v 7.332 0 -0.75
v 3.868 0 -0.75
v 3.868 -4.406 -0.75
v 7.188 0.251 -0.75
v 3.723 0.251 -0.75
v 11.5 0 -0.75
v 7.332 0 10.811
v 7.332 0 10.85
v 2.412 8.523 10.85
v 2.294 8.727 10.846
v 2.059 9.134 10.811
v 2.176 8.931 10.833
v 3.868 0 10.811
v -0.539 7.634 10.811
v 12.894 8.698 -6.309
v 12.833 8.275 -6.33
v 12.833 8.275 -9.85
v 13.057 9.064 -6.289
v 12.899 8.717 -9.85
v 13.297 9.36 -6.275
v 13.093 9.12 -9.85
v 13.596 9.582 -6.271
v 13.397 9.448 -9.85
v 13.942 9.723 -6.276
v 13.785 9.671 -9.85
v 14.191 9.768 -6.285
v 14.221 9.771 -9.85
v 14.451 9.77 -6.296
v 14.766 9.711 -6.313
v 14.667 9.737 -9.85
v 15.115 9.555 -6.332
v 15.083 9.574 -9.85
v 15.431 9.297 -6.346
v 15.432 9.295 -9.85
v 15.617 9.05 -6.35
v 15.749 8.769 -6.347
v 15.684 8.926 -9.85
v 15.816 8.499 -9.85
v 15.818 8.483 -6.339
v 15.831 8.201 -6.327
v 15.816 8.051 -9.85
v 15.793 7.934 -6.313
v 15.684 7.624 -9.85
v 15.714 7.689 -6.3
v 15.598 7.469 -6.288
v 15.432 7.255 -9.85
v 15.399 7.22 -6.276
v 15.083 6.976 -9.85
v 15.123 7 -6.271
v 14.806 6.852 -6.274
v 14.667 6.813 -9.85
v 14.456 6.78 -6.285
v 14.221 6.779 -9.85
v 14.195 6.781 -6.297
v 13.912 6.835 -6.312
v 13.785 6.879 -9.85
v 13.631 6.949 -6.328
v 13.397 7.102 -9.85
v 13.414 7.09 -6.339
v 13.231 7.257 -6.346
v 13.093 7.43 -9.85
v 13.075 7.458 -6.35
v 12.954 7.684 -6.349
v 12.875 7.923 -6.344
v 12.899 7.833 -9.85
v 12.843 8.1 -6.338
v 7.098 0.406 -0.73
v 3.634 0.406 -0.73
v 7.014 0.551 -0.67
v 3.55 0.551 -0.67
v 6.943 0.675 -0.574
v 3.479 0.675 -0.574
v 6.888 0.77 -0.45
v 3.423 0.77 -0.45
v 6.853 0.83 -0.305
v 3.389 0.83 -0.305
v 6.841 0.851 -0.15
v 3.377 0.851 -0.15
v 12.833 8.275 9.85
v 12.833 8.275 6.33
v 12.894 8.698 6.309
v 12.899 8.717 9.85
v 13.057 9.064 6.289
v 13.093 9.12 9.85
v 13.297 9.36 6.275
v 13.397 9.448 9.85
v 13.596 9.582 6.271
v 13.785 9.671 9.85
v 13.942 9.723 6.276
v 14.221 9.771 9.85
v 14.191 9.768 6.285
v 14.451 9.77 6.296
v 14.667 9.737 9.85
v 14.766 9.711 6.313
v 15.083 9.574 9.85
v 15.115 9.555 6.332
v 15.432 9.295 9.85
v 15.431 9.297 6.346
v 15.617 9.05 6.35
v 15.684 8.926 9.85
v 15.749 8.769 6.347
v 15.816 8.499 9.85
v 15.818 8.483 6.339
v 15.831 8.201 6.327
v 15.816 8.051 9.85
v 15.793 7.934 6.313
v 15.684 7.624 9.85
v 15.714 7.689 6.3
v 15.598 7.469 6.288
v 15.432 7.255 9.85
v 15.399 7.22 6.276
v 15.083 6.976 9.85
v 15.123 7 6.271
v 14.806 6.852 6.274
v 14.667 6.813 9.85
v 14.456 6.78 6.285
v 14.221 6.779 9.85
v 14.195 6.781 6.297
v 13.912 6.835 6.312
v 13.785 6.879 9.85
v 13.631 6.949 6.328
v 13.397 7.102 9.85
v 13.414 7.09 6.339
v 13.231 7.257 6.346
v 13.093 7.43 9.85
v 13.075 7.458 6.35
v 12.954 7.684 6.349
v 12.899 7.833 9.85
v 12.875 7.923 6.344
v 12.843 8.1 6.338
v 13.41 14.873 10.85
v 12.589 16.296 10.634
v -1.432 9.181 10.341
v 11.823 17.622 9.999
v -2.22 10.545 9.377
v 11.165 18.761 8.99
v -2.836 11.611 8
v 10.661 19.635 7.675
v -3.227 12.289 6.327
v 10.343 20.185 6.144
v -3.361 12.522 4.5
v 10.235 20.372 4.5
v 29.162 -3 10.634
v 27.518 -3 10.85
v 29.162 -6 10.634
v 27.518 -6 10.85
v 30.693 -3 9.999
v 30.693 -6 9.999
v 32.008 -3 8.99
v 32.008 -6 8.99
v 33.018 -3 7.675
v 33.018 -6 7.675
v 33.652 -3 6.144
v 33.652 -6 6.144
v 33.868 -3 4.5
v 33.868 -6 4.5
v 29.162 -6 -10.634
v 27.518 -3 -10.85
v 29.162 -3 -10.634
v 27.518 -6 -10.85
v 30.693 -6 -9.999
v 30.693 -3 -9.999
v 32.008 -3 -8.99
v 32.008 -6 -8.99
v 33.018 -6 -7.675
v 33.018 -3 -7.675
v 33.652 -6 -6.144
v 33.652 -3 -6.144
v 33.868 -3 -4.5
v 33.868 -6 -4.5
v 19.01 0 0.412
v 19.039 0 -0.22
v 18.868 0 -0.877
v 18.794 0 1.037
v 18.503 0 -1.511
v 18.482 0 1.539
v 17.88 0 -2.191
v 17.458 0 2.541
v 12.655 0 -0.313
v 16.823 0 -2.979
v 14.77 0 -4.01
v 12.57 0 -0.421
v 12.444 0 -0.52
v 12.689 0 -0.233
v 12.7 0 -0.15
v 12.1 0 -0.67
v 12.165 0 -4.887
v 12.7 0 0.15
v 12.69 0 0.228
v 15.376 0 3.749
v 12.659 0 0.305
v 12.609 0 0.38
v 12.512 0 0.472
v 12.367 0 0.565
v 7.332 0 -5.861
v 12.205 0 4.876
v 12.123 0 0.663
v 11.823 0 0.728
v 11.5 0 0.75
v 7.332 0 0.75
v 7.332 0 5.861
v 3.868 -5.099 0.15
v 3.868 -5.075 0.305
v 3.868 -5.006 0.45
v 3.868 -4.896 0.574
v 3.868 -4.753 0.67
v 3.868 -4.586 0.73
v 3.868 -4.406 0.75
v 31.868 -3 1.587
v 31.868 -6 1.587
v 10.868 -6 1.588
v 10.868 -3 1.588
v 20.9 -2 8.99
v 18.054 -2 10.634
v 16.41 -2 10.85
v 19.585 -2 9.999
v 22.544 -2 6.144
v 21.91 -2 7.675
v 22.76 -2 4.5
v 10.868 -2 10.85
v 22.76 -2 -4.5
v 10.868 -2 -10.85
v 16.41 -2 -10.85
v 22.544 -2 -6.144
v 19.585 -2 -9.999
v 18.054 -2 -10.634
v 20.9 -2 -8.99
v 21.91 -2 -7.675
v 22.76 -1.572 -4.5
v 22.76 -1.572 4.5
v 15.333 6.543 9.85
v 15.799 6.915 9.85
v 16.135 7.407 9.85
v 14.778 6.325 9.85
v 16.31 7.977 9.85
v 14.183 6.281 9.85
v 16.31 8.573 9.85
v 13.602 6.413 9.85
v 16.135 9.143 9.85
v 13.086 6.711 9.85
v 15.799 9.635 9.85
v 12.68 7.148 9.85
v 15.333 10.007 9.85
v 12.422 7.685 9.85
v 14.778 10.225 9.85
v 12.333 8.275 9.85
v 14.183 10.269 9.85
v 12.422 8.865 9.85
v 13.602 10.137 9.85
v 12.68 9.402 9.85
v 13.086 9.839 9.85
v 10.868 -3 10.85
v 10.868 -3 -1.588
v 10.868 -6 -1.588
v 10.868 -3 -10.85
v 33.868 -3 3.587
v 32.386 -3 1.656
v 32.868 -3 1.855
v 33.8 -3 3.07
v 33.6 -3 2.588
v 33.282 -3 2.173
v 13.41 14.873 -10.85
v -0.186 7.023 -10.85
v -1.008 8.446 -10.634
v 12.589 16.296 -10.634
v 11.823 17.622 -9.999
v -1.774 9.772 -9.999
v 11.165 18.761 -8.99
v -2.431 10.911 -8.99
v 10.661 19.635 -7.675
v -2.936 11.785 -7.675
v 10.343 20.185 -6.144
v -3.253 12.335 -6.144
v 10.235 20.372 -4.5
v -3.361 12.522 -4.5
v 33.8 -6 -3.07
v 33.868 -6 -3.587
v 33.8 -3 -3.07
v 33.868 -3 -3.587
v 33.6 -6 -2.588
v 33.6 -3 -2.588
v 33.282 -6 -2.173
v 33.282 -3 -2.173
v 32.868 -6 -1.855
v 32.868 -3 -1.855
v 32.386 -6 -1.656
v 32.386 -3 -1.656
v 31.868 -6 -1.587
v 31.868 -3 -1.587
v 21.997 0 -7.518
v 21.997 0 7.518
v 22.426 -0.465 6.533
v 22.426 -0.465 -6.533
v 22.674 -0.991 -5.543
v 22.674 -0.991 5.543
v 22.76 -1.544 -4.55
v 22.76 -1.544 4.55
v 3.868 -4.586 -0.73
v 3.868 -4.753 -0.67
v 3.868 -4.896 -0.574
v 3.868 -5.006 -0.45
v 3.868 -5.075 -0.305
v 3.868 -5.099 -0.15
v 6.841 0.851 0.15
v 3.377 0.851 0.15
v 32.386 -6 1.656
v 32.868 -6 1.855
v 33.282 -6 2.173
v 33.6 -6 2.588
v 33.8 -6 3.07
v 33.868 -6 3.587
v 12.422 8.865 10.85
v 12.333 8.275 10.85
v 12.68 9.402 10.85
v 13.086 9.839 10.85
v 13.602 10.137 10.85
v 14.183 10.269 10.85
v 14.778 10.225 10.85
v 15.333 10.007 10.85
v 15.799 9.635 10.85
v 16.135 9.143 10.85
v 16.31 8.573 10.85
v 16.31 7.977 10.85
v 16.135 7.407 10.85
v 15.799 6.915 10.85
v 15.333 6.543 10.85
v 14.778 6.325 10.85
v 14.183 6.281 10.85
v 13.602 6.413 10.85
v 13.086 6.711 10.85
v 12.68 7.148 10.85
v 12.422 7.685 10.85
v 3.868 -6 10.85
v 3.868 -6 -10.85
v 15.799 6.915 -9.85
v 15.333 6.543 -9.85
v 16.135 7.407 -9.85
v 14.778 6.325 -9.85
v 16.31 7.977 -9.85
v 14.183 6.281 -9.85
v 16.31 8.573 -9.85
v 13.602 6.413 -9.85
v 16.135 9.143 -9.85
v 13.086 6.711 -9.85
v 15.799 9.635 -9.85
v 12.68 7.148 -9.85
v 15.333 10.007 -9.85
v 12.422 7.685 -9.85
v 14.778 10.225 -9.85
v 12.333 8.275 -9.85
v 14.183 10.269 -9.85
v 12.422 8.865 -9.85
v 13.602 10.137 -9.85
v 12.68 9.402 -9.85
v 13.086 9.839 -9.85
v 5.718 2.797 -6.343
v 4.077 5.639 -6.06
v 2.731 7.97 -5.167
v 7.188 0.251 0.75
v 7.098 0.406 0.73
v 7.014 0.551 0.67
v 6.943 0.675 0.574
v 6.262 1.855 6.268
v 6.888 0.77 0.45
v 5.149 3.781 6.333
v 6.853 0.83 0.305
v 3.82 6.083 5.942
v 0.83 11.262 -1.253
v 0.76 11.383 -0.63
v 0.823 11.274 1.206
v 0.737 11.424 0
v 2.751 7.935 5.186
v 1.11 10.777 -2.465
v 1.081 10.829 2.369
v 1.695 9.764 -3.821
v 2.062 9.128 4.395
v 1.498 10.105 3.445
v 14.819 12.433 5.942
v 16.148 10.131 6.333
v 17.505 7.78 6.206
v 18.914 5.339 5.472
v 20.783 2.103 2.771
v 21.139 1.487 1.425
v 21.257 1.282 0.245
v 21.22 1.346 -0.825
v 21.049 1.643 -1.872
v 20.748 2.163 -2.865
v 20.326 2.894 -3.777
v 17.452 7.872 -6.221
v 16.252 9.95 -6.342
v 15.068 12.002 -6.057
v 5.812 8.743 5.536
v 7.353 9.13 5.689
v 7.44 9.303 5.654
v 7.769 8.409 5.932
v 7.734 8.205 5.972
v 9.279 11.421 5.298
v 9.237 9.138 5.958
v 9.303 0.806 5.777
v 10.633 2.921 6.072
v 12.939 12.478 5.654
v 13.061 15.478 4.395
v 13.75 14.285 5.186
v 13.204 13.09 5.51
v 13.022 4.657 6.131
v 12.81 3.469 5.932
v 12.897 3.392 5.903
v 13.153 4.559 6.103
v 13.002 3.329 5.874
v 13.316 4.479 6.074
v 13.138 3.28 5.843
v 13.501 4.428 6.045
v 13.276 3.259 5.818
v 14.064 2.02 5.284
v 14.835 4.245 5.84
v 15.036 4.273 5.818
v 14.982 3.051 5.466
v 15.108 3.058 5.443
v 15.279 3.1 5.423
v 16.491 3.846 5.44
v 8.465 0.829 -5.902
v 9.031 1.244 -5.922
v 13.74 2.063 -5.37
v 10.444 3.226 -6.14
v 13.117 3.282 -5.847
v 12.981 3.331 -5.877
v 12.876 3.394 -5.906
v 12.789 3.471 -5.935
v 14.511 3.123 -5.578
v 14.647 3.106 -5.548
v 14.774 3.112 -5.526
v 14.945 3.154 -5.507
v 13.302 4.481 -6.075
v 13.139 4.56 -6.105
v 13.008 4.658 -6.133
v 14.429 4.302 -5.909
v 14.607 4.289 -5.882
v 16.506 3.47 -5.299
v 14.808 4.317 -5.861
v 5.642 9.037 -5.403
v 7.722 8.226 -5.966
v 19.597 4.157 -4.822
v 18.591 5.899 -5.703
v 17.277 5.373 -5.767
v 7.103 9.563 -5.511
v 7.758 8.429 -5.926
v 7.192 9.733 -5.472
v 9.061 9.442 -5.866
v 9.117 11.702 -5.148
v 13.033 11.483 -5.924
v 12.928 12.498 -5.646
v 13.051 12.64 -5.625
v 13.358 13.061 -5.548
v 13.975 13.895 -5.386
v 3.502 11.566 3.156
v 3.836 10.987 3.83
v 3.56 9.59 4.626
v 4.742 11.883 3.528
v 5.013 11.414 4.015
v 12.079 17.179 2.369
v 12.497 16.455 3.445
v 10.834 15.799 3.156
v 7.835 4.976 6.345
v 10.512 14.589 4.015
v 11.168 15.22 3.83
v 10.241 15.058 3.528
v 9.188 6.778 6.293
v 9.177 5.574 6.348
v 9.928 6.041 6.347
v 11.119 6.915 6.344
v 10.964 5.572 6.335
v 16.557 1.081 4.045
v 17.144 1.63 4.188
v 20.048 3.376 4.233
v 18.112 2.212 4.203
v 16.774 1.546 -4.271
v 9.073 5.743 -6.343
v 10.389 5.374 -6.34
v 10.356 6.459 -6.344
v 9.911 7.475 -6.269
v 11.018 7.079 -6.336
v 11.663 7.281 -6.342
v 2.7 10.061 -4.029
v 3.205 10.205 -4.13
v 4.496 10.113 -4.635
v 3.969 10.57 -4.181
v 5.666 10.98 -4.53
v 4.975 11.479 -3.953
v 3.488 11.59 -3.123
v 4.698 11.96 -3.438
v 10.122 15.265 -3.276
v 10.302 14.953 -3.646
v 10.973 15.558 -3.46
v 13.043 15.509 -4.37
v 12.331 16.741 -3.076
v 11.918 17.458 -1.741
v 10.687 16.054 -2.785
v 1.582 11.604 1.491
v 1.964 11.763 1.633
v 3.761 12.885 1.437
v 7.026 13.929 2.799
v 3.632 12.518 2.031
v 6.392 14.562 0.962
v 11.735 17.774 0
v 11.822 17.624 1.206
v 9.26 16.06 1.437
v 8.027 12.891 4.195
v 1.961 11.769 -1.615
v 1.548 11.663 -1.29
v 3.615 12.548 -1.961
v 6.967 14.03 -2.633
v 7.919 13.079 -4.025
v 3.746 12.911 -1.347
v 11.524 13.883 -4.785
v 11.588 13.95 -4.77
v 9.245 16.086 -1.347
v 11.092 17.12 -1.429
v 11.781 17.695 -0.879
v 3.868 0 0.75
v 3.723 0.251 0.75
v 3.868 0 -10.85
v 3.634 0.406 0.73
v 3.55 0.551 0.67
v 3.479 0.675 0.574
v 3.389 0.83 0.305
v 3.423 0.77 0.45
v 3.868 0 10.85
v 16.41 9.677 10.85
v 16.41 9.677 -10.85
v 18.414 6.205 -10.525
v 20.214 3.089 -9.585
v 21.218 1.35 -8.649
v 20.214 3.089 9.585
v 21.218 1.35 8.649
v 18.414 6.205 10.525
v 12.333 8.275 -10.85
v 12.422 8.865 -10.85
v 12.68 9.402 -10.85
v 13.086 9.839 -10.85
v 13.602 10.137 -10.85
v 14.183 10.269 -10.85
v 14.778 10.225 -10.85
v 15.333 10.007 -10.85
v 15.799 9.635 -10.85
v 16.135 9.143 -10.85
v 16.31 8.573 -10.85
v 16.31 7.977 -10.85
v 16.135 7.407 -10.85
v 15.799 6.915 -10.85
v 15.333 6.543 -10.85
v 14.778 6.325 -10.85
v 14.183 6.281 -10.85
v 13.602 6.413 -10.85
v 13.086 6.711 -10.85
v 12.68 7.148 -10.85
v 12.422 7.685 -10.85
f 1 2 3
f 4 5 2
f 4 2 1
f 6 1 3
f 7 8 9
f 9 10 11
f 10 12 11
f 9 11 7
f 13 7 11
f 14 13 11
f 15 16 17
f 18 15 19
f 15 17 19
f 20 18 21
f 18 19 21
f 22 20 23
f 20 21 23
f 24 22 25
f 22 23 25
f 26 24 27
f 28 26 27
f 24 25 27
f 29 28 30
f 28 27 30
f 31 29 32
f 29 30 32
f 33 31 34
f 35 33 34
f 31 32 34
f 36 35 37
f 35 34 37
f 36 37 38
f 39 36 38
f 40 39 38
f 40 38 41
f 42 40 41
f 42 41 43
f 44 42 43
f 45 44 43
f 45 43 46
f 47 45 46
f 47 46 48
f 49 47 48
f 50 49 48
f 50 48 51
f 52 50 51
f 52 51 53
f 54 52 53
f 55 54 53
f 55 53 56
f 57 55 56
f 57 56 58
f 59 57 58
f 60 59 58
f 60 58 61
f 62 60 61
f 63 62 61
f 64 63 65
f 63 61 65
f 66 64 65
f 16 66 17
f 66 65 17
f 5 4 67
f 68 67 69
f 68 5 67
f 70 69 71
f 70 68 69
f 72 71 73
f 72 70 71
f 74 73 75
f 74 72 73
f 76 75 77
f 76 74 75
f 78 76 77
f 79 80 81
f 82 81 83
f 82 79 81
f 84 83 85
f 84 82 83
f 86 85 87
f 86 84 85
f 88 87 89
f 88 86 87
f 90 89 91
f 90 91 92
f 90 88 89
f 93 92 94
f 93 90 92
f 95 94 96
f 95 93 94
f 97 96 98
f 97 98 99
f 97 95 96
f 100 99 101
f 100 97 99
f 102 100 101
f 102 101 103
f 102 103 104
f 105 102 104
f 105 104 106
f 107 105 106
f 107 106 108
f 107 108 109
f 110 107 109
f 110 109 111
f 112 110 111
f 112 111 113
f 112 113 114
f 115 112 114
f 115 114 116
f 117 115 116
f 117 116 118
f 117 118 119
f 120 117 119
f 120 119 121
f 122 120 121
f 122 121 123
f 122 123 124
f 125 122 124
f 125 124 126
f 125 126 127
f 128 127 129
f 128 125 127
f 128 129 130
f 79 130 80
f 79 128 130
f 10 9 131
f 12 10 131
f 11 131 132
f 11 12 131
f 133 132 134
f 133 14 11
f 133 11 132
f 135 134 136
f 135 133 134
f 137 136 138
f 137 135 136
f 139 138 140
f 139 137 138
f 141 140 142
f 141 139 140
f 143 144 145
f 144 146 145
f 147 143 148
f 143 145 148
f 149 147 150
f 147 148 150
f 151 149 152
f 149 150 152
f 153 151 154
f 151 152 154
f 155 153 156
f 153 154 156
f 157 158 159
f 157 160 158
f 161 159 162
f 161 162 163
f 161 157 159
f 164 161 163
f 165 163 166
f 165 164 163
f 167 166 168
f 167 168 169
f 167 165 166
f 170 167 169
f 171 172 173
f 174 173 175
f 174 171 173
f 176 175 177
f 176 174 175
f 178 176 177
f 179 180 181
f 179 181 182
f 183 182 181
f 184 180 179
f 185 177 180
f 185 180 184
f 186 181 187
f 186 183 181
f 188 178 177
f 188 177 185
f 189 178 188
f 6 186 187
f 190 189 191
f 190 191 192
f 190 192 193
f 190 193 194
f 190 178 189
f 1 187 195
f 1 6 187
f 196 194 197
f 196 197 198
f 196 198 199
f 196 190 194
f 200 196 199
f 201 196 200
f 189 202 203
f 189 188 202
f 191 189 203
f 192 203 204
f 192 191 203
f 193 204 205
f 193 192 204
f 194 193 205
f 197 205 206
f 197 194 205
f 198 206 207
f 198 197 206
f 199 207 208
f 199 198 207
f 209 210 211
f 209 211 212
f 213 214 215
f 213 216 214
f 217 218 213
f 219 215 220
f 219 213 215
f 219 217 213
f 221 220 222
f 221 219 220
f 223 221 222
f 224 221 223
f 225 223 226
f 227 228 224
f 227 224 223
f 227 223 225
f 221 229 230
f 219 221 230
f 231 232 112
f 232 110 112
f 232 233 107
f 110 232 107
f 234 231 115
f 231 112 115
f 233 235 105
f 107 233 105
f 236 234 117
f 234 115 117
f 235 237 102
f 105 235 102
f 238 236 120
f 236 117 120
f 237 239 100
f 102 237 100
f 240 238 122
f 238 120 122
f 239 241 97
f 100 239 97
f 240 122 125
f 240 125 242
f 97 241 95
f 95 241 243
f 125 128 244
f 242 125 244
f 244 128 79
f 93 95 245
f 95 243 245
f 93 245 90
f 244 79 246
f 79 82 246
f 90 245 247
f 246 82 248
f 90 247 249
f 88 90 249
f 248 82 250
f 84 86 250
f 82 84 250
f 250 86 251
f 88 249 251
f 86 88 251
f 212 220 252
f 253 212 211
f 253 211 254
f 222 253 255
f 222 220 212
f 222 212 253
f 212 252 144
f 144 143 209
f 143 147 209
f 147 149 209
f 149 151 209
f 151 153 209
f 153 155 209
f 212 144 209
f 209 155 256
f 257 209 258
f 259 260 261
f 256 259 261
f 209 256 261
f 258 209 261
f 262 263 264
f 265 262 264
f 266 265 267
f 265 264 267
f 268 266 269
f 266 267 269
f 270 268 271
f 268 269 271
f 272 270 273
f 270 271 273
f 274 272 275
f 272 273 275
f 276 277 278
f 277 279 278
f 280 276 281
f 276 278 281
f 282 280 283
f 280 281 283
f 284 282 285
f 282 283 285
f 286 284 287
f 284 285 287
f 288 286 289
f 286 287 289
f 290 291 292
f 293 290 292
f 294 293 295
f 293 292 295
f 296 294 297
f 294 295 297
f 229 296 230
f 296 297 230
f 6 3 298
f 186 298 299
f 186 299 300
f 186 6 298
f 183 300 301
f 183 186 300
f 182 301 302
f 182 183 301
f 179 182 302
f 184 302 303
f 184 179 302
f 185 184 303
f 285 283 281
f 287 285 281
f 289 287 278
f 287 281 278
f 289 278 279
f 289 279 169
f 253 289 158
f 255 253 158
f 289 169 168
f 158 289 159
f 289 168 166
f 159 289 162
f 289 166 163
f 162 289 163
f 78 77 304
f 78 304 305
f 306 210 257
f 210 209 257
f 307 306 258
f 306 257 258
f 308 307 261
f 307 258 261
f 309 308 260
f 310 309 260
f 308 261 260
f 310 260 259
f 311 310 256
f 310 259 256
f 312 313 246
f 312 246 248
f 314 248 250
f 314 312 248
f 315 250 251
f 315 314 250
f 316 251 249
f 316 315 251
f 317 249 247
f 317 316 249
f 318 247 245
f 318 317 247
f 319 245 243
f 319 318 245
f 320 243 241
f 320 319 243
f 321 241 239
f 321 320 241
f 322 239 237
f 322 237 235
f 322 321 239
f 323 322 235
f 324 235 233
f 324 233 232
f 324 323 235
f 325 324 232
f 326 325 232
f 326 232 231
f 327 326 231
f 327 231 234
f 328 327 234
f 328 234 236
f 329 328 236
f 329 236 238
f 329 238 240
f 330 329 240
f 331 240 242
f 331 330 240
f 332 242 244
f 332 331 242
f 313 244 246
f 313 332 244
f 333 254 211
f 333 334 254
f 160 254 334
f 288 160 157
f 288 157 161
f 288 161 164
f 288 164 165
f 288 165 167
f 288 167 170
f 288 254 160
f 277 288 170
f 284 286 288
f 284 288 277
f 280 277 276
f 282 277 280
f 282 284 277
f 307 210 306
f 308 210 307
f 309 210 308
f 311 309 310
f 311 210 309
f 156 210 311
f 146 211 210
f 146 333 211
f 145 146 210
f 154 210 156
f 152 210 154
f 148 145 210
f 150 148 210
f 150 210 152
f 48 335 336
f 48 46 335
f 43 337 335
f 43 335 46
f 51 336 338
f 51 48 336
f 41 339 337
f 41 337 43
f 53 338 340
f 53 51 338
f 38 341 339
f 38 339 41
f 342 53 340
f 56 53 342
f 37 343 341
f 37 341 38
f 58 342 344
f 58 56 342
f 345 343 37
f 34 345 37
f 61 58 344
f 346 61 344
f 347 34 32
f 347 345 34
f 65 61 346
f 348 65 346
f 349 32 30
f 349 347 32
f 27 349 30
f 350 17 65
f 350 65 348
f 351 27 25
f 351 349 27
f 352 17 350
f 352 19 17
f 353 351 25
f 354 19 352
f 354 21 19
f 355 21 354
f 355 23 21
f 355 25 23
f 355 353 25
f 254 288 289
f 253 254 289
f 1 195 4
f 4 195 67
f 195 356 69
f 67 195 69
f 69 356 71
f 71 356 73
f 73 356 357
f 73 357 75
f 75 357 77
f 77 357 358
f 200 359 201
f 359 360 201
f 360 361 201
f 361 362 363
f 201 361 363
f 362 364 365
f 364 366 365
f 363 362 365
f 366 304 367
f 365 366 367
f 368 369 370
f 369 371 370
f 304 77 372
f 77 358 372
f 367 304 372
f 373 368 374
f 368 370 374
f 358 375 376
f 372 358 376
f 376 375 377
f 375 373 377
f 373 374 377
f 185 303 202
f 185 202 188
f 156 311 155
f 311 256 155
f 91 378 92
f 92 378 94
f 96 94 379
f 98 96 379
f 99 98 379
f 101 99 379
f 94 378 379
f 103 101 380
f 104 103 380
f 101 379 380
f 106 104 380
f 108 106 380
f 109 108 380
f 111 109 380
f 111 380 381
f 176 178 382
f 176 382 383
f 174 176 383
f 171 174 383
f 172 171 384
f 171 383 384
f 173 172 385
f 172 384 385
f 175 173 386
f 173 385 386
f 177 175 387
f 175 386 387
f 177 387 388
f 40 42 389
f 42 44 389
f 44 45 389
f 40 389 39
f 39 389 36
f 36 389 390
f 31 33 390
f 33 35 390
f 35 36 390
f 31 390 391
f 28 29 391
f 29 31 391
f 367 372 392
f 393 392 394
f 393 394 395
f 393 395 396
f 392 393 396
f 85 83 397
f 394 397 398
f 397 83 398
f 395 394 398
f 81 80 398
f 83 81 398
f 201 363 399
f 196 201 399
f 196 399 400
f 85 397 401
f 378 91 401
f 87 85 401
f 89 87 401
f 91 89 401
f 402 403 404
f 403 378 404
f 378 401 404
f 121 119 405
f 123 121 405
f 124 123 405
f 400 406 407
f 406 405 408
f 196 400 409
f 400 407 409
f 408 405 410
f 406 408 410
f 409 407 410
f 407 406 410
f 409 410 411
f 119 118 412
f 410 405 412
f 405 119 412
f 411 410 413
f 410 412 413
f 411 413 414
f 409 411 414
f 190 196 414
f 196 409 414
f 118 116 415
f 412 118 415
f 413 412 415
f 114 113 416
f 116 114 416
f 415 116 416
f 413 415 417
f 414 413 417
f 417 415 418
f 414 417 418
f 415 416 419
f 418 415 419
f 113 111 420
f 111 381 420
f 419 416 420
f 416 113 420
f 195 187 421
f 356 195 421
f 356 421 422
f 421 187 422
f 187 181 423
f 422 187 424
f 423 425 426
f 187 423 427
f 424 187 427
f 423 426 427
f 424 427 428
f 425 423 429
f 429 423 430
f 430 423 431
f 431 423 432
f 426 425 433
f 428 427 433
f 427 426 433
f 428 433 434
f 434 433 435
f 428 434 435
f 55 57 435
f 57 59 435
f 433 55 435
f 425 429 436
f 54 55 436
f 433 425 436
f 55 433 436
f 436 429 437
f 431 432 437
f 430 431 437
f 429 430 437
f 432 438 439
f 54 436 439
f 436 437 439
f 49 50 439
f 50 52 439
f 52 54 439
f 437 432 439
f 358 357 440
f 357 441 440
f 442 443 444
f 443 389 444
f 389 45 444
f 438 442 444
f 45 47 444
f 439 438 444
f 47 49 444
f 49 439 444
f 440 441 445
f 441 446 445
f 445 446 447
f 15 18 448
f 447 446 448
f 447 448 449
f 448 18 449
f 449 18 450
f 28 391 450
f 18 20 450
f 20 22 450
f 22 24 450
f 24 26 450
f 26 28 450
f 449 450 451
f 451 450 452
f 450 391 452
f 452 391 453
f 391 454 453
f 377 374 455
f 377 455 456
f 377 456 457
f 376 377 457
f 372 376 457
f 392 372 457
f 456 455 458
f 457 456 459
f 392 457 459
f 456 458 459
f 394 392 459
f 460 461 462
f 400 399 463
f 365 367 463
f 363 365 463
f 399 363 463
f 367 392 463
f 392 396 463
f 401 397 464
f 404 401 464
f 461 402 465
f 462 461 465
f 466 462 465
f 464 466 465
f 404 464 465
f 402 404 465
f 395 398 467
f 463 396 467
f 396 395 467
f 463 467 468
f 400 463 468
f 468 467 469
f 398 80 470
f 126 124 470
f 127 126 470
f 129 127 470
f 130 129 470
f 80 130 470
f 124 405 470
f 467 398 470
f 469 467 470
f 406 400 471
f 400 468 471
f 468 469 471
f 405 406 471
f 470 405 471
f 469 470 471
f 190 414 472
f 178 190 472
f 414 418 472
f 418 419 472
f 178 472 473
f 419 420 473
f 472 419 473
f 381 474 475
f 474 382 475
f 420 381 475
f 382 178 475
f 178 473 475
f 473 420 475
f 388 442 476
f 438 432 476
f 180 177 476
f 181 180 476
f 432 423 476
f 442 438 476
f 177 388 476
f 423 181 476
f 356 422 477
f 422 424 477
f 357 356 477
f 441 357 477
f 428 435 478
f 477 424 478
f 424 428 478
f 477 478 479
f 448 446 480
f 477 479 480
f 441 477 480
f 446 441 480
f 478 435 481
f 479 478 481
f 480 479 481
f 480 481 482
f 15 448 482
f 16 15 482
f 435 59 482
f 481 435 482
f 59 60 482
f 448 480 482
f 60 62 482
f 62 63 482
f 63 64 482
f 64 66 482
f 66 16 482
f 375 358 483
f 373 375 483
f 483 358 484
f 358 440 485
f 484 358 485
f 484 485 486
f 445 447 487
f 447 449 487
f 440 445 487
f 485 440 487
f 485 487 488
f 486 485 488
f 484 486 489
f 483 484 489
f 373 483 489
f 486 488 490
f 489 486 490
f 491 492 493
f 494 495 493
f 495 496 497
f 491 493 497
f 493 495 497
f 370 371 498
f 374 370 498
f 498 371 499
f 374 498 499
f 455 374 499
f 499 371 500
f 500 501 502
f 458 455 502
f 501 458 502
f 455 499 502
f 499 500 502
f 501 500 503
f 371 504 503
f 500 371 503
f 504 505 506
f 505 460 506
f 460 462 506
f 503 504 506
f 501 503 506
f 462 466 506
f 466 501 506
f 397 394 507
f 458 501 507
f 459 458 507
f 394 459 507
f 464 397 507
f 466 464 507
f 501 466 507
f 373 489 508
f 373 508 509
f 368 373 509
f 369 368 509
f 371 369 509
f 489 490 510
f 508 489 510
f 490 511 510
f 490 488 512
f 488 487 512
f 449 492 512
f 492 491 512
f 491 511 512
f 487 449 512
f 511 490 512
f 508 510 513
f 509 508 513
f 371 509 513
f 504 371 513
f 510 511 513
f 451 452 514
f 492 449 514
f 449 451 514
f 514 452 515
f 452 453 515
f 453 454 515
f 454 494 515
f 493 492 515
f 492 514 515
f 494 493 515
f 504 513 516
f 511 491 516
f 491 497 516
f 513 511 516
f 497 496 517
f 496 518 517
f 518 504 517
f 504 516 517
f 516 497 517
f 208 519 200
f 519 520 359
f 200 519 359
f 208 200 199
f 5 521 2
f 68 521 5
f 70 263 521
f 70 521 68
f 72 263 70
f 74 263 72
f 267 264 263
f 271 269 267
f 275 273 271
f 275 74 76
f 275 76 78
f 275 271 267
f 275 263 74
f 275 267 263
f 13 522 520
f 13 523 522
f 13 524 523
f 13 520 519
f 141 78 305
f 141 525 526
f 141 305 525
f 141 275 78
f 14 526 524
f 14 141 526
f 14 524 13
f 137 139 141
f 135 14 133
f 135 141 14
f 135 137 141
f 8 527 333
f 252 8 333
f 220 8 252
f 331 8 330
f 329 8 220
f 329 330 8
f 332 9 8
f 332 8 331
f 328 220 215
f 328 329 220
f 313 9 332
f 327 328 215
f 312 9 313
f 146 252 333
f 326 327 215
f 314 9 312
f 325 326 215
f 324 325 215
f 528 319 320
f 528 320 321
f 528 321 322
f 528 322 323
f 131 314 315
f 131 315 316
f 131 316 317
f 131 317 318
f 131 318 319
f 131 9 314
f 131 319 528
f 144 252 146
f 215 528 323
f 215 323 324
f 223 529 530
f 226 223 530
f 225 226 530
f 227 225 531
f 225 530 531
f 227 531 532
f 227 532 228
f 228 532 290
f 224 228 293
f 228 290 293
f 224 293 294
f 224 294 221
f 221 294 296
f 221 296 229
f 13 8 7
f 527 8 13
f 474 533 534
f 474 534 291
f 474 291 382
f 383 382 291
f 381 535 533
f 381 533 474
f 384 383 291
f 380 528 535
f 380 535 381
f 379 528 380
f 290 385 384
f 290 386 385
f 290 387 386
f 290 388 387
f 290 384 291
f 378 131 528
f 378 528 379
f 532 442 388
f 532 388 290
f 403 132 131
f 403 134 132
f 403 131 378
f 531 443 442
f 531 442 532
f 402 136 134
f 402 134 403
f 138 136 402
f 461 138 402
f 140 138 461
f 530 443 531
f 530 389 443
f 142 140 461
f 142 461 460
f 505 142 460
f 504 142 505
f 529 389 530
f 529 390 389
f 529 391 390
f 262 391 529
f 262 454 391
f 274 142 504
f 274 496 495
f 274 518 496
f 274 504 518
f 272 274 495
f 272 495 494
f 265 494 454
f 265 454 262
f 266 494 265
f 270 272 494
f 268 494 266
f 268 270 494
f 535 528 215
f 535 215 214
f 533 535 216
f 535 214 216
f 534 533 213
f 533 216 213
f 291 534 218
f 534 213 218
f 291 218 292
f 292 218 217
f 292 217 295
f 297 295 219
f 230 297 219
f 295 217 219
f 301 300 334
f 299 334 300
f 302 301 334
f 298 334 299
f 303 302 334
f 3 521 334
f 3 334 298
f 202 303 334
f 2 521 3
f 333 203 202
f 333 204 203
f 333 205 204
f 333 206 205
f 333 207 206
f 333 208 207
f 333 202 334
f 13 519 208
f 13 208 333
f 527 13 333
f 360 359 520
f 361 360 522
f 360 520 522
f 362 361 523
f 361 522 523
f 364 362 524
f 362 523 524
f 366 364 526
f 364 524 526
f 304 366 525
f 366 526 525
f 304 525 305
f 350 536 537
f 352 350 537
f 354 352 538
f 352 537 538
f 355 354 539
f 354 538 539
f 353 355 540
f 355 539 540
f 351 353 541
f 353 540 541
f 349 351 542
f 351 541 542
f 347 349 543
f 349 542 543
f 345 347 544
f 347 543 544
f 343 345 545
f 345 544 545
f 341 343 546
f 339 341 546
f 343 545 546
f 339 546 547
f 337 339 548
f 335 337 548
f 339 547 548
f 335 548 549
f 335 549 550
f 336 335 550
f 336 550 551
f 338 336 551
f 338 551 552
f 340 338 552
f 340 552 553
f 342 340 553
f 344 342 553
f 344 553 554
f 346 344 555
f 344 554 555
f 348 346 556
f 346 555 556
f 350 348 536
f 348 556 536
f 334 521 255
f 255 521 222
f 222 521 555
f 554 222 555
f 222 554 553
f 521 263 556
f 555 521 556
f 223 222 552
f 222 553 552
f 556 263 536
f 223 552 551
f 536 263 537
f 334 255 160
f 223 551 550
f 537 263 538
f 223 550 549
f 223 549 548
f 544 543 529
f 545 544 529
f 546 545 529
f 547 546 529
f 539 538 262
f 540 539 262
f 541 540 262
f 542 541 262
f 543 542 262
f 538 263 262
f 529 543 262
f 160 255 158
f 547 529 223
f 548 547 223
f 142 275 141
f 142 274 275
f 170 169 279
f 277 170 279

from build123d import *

# Parameters (mm, degrees)
SKETCH2_W           = 21.7
SKETCH2_H           = 25.05
SKETCH2_RX          = 9.525
SKETCH2_RY          = 6.35
BOSS_EXTRUDE1_DEPTH = 12.7
SKETCH3_W           = 21.660653916
SKETCH3_H           = 25.05
BOSS_EXTRUDE2_DEPTH = 3
SKETCH5_W           = 18.892037138
SKETCH5_H           = 21.7
BOSS_EXTRUDE3_DEPTH = 2
SKETCH6_W           = 30
SKETCH6_H           = 21.7
BOSS_EXTRUDE4_DEPTH = 4
SKETCH7_W           = 21.7
SKETCH7_H           = 1
SKETCH7_W_2         = 3.175
SKETCH7_H_2         = 3
CUT_EXTRUDE2_DEPTH  = 23
SKETCH7_3_W         = 21.7
SKETCH7_3_H         = 7.272473706
CUT_EXTRUDE3_DEPTH  = 44.803879418
CUT_REVOLVE1_START  = -0.75
CUT_REVOLVE1_DEPTH  = 1.5
FILLET1_R           = 0.6
CUT_EXTRUDE4_REACH  = 47.088
SKETCH9_R           = 1.5
SKETCH10_R          = 2
CUT_EXTRUDE7_DEPTH  = 1
FILLET5_R           = 6.35
FILLET6_R           = 2
FILLET7_R           = 2


# Read off the part's stored shape, not the designer's step: Cut-Revolve1
with BuildPart() as part:
    # Sketch2 → Boss-Extrude1 (new body)
    with BuildSketch(Plane(origin=(16.497783942, 9.525, 0), x_dir=(0, 0, -1), z_dir=(0.8660254037844379, 0.5000000000000013, 0))):
        Rectangle(SKETCH2_W, SKETCH2_H)
        with Locations(Location((0, 0), (0, 0, 90))):
            Ellipse(SKETCH2_RX, SKETCH2_RY, mode=Mode.SUBTRACT)
    extrude(amount=-BOSS_EXTRUDE1_DEPTH)

    # Sketch3 → Boss-Extrude2 (add)
    with BuildSketch(Plane(origin=(5.499261314, 3.175, 0), x_dir=(0, 0, 1), z_dir=(-0.8660254037844379, -0.5000000000000014, 0))):
        with Locations((-0.019673042, 0)):
            Rectangle(SKETCH3_W, SKETCH3_H)
    extrude(amount=BOSS_EXTRUDE2_DEPTH)

    # Sketch5 → Boss-Extrude3 (add)
    with BuildSketch(Plane(origin=(0, 0, 0), x_dir=(-1, 0, 0), z_dir=(0, 1, 0))):
        with Locations((-13.314265373, 0)):
            Rectangle(SKETCH5_W, SKETCH5_H)
    extrude(amount=-BOSS_EXTRUDE3_DEPTH)

    # Sketch6 → Boss-Extrude4 (add)
    with BuildSketch(Plane.XZ.offset(2)):
        with Locations((18.868246804, 0)):
            Rectangle(SKETCH6_W, SKETCH6_H)
    extrude(amount=BOSS_EXTRUDE4_DEPTH)

    # Sketch7 → Cut-Extrude2 (cut)
    with BuildSketch(Plane(origin=(33.868246804, 0, 0), x_dir=(0, 0, -1), z_dir=(1, 0, 0))):
        with Locations((0, -2.5)):
            Rectangle(SKETCH7_W, SKETCH7_H)
        with Locations((0, -4.5)):
            Rectangle(SKETCH7_W_2, SKETCH7_H_2)
    extrude(amount=-CUT_EXTRUDE2_DEPTH, mode=Mode.SUBTRACT)

    # Sketch7<3> → Cut-Extrude3 (cut, through all)
    with BuildSketch(Plane(origin=(33.868246804, 0, 0), x_dir=(0, 0, -1), z_dir=(1, 0, 0))):
        with Locations((0, -9.636236853)):
            Rectangle(SKETCH7_3_W, SKETCH7_3_H)
    extrude(amount=-CUT_EXTRUDE3_DEPTH, mode=Mode.SUBTRACT)

    # Cut-Revolve1 outline → Cut-Revolve1 (cut)
    with BuildSketch(Plane.XY.offset(CUT_REVOLVE1_START)):
        Polygon((6.841174209, 0.850738686), (3.377072594, 0.850738686), (3.868246804, 0), (3.868246804, -5.099015085), (12.7, 0), (7.332348419, 0), align=None)
    extrude(amount=CUT_REVOLVE1_DEPTH, mode=Mode.SUBTRACT)

    # Fillet1
    fillet1_edges = [part.edges().sort_by_distance(p)[0] for p in [
        (5.109123401, 0.850738686, 0.75),
        (5.109123401, 0.850738686, -0.75),
        (8.284123402, -2.549507542, -0.75),
        (8.284123402, -2.549507542, 0.75),
    ]]
    fillet(fillet1_edges, radius=FILLET1_R)

    # Sketch9 → Cut-Extrude4 (cut, up to next)
    with BuildSketch(Plane(origin=(0, 0, -10.85), x_dir=(-1, 0, 0), z_dir=(0, 0, -1)), mode=Mode.PRIVATE) as cut_extrude4_sk1:
        with Locations((-14.332720433, 8.275)):
            Circle(SKETCH9_R)
    cut_extrude4_tool1 = extrude(cut_extrude4_sk1.sketch, amount=-CUT_EXTRUDE4_REACH, mode=Mode.PRIVATE) & part.part
    cut_extrude4 = cut_extrude4_tool1.solids().sort_by_distance((14.33272, 8.275, -10.85))[0]
    add(cut_extrude4, mode=Mode.SUBTRACT)

    # Sketch10 → Cut-Extrude7 (cut)
    with BuildSketch(Plane(origin=(0, 0, -10.85), x_dir=(-1, 0, 0), z_dir=(0, 0, -1))):
        with Locations((-14.332720433, 8.275)):
            Circle(SKETCH10_R)
    cut_extrude7 = extrude(amount=-CUT_EXTRUDE7_DEPTH, mode=Mode.SUBTRACT)

    # Mirror1: Cut-Extrude4, Cut-Extrude7 across plane
    add(cut_extrude4.mirror(Plane.XY), mode=Mode.SUBTRACT)
    add(cut_extrude7.mirror(Plane.XY), mode=Mode.SUBTRACT)

    # Fillet5
    fillet5_edges = [part.edges().sort_by_distance(p)[0] for p in [
        (33.868246804, -4.5, 10.85),
        (33.868246804, -4.5, -10.85),
        (22.760283942, -1, -10.85),
        (22.760283942, -1, 10.85),
        (4.736022628, 17.196968182, 10.85),
        (3.436984522, 16.446968182, -10.85),
    ]]
    fillet(fillet5_edges, radius=FILLET5_R)

    # Fillet6
    fillet6_edges = [part.edges().sort_by_distance(p)[0] for p in [
        (33.868246804, -4.5, 1.5875),
        (33.868246804, -4.5, -1.5875),
    ]]
    fillet(fillet6_edges, radius=FILLET6_R)

    # Fillet7
    # the kernel refuses this fillet: 2 mm, written as the material it takes off along each edge
    with BuildSketch(Plane(origin=(22.760283942, 0, 8.429393602), x_dir=(-1, 0, 0), z_dir=(0, 0, -1))) as fillet7_piece_1:
        with BuildLine():
            CenterArc((2, -1.571757441), FILLET7_R, 128.197977663, 51.802022337)
            Line((0, -1.571757441), (-0.04, -1.571757441))
            Line((-0.04, -1.571757441), (-0.04, 0))
            Line((-0.04, 0), (0, 0.04))
            ThreePointArc((0, 0.04), (0.381619343, 0.04), (0.73850346, 0.031435149))
            Line((0.73850346, 0.031435149), (0.763238686, 0))
        make_face()
    extrude(amount=16.858787203, mode=Mode.SUBTRACT)


solid = part.part
